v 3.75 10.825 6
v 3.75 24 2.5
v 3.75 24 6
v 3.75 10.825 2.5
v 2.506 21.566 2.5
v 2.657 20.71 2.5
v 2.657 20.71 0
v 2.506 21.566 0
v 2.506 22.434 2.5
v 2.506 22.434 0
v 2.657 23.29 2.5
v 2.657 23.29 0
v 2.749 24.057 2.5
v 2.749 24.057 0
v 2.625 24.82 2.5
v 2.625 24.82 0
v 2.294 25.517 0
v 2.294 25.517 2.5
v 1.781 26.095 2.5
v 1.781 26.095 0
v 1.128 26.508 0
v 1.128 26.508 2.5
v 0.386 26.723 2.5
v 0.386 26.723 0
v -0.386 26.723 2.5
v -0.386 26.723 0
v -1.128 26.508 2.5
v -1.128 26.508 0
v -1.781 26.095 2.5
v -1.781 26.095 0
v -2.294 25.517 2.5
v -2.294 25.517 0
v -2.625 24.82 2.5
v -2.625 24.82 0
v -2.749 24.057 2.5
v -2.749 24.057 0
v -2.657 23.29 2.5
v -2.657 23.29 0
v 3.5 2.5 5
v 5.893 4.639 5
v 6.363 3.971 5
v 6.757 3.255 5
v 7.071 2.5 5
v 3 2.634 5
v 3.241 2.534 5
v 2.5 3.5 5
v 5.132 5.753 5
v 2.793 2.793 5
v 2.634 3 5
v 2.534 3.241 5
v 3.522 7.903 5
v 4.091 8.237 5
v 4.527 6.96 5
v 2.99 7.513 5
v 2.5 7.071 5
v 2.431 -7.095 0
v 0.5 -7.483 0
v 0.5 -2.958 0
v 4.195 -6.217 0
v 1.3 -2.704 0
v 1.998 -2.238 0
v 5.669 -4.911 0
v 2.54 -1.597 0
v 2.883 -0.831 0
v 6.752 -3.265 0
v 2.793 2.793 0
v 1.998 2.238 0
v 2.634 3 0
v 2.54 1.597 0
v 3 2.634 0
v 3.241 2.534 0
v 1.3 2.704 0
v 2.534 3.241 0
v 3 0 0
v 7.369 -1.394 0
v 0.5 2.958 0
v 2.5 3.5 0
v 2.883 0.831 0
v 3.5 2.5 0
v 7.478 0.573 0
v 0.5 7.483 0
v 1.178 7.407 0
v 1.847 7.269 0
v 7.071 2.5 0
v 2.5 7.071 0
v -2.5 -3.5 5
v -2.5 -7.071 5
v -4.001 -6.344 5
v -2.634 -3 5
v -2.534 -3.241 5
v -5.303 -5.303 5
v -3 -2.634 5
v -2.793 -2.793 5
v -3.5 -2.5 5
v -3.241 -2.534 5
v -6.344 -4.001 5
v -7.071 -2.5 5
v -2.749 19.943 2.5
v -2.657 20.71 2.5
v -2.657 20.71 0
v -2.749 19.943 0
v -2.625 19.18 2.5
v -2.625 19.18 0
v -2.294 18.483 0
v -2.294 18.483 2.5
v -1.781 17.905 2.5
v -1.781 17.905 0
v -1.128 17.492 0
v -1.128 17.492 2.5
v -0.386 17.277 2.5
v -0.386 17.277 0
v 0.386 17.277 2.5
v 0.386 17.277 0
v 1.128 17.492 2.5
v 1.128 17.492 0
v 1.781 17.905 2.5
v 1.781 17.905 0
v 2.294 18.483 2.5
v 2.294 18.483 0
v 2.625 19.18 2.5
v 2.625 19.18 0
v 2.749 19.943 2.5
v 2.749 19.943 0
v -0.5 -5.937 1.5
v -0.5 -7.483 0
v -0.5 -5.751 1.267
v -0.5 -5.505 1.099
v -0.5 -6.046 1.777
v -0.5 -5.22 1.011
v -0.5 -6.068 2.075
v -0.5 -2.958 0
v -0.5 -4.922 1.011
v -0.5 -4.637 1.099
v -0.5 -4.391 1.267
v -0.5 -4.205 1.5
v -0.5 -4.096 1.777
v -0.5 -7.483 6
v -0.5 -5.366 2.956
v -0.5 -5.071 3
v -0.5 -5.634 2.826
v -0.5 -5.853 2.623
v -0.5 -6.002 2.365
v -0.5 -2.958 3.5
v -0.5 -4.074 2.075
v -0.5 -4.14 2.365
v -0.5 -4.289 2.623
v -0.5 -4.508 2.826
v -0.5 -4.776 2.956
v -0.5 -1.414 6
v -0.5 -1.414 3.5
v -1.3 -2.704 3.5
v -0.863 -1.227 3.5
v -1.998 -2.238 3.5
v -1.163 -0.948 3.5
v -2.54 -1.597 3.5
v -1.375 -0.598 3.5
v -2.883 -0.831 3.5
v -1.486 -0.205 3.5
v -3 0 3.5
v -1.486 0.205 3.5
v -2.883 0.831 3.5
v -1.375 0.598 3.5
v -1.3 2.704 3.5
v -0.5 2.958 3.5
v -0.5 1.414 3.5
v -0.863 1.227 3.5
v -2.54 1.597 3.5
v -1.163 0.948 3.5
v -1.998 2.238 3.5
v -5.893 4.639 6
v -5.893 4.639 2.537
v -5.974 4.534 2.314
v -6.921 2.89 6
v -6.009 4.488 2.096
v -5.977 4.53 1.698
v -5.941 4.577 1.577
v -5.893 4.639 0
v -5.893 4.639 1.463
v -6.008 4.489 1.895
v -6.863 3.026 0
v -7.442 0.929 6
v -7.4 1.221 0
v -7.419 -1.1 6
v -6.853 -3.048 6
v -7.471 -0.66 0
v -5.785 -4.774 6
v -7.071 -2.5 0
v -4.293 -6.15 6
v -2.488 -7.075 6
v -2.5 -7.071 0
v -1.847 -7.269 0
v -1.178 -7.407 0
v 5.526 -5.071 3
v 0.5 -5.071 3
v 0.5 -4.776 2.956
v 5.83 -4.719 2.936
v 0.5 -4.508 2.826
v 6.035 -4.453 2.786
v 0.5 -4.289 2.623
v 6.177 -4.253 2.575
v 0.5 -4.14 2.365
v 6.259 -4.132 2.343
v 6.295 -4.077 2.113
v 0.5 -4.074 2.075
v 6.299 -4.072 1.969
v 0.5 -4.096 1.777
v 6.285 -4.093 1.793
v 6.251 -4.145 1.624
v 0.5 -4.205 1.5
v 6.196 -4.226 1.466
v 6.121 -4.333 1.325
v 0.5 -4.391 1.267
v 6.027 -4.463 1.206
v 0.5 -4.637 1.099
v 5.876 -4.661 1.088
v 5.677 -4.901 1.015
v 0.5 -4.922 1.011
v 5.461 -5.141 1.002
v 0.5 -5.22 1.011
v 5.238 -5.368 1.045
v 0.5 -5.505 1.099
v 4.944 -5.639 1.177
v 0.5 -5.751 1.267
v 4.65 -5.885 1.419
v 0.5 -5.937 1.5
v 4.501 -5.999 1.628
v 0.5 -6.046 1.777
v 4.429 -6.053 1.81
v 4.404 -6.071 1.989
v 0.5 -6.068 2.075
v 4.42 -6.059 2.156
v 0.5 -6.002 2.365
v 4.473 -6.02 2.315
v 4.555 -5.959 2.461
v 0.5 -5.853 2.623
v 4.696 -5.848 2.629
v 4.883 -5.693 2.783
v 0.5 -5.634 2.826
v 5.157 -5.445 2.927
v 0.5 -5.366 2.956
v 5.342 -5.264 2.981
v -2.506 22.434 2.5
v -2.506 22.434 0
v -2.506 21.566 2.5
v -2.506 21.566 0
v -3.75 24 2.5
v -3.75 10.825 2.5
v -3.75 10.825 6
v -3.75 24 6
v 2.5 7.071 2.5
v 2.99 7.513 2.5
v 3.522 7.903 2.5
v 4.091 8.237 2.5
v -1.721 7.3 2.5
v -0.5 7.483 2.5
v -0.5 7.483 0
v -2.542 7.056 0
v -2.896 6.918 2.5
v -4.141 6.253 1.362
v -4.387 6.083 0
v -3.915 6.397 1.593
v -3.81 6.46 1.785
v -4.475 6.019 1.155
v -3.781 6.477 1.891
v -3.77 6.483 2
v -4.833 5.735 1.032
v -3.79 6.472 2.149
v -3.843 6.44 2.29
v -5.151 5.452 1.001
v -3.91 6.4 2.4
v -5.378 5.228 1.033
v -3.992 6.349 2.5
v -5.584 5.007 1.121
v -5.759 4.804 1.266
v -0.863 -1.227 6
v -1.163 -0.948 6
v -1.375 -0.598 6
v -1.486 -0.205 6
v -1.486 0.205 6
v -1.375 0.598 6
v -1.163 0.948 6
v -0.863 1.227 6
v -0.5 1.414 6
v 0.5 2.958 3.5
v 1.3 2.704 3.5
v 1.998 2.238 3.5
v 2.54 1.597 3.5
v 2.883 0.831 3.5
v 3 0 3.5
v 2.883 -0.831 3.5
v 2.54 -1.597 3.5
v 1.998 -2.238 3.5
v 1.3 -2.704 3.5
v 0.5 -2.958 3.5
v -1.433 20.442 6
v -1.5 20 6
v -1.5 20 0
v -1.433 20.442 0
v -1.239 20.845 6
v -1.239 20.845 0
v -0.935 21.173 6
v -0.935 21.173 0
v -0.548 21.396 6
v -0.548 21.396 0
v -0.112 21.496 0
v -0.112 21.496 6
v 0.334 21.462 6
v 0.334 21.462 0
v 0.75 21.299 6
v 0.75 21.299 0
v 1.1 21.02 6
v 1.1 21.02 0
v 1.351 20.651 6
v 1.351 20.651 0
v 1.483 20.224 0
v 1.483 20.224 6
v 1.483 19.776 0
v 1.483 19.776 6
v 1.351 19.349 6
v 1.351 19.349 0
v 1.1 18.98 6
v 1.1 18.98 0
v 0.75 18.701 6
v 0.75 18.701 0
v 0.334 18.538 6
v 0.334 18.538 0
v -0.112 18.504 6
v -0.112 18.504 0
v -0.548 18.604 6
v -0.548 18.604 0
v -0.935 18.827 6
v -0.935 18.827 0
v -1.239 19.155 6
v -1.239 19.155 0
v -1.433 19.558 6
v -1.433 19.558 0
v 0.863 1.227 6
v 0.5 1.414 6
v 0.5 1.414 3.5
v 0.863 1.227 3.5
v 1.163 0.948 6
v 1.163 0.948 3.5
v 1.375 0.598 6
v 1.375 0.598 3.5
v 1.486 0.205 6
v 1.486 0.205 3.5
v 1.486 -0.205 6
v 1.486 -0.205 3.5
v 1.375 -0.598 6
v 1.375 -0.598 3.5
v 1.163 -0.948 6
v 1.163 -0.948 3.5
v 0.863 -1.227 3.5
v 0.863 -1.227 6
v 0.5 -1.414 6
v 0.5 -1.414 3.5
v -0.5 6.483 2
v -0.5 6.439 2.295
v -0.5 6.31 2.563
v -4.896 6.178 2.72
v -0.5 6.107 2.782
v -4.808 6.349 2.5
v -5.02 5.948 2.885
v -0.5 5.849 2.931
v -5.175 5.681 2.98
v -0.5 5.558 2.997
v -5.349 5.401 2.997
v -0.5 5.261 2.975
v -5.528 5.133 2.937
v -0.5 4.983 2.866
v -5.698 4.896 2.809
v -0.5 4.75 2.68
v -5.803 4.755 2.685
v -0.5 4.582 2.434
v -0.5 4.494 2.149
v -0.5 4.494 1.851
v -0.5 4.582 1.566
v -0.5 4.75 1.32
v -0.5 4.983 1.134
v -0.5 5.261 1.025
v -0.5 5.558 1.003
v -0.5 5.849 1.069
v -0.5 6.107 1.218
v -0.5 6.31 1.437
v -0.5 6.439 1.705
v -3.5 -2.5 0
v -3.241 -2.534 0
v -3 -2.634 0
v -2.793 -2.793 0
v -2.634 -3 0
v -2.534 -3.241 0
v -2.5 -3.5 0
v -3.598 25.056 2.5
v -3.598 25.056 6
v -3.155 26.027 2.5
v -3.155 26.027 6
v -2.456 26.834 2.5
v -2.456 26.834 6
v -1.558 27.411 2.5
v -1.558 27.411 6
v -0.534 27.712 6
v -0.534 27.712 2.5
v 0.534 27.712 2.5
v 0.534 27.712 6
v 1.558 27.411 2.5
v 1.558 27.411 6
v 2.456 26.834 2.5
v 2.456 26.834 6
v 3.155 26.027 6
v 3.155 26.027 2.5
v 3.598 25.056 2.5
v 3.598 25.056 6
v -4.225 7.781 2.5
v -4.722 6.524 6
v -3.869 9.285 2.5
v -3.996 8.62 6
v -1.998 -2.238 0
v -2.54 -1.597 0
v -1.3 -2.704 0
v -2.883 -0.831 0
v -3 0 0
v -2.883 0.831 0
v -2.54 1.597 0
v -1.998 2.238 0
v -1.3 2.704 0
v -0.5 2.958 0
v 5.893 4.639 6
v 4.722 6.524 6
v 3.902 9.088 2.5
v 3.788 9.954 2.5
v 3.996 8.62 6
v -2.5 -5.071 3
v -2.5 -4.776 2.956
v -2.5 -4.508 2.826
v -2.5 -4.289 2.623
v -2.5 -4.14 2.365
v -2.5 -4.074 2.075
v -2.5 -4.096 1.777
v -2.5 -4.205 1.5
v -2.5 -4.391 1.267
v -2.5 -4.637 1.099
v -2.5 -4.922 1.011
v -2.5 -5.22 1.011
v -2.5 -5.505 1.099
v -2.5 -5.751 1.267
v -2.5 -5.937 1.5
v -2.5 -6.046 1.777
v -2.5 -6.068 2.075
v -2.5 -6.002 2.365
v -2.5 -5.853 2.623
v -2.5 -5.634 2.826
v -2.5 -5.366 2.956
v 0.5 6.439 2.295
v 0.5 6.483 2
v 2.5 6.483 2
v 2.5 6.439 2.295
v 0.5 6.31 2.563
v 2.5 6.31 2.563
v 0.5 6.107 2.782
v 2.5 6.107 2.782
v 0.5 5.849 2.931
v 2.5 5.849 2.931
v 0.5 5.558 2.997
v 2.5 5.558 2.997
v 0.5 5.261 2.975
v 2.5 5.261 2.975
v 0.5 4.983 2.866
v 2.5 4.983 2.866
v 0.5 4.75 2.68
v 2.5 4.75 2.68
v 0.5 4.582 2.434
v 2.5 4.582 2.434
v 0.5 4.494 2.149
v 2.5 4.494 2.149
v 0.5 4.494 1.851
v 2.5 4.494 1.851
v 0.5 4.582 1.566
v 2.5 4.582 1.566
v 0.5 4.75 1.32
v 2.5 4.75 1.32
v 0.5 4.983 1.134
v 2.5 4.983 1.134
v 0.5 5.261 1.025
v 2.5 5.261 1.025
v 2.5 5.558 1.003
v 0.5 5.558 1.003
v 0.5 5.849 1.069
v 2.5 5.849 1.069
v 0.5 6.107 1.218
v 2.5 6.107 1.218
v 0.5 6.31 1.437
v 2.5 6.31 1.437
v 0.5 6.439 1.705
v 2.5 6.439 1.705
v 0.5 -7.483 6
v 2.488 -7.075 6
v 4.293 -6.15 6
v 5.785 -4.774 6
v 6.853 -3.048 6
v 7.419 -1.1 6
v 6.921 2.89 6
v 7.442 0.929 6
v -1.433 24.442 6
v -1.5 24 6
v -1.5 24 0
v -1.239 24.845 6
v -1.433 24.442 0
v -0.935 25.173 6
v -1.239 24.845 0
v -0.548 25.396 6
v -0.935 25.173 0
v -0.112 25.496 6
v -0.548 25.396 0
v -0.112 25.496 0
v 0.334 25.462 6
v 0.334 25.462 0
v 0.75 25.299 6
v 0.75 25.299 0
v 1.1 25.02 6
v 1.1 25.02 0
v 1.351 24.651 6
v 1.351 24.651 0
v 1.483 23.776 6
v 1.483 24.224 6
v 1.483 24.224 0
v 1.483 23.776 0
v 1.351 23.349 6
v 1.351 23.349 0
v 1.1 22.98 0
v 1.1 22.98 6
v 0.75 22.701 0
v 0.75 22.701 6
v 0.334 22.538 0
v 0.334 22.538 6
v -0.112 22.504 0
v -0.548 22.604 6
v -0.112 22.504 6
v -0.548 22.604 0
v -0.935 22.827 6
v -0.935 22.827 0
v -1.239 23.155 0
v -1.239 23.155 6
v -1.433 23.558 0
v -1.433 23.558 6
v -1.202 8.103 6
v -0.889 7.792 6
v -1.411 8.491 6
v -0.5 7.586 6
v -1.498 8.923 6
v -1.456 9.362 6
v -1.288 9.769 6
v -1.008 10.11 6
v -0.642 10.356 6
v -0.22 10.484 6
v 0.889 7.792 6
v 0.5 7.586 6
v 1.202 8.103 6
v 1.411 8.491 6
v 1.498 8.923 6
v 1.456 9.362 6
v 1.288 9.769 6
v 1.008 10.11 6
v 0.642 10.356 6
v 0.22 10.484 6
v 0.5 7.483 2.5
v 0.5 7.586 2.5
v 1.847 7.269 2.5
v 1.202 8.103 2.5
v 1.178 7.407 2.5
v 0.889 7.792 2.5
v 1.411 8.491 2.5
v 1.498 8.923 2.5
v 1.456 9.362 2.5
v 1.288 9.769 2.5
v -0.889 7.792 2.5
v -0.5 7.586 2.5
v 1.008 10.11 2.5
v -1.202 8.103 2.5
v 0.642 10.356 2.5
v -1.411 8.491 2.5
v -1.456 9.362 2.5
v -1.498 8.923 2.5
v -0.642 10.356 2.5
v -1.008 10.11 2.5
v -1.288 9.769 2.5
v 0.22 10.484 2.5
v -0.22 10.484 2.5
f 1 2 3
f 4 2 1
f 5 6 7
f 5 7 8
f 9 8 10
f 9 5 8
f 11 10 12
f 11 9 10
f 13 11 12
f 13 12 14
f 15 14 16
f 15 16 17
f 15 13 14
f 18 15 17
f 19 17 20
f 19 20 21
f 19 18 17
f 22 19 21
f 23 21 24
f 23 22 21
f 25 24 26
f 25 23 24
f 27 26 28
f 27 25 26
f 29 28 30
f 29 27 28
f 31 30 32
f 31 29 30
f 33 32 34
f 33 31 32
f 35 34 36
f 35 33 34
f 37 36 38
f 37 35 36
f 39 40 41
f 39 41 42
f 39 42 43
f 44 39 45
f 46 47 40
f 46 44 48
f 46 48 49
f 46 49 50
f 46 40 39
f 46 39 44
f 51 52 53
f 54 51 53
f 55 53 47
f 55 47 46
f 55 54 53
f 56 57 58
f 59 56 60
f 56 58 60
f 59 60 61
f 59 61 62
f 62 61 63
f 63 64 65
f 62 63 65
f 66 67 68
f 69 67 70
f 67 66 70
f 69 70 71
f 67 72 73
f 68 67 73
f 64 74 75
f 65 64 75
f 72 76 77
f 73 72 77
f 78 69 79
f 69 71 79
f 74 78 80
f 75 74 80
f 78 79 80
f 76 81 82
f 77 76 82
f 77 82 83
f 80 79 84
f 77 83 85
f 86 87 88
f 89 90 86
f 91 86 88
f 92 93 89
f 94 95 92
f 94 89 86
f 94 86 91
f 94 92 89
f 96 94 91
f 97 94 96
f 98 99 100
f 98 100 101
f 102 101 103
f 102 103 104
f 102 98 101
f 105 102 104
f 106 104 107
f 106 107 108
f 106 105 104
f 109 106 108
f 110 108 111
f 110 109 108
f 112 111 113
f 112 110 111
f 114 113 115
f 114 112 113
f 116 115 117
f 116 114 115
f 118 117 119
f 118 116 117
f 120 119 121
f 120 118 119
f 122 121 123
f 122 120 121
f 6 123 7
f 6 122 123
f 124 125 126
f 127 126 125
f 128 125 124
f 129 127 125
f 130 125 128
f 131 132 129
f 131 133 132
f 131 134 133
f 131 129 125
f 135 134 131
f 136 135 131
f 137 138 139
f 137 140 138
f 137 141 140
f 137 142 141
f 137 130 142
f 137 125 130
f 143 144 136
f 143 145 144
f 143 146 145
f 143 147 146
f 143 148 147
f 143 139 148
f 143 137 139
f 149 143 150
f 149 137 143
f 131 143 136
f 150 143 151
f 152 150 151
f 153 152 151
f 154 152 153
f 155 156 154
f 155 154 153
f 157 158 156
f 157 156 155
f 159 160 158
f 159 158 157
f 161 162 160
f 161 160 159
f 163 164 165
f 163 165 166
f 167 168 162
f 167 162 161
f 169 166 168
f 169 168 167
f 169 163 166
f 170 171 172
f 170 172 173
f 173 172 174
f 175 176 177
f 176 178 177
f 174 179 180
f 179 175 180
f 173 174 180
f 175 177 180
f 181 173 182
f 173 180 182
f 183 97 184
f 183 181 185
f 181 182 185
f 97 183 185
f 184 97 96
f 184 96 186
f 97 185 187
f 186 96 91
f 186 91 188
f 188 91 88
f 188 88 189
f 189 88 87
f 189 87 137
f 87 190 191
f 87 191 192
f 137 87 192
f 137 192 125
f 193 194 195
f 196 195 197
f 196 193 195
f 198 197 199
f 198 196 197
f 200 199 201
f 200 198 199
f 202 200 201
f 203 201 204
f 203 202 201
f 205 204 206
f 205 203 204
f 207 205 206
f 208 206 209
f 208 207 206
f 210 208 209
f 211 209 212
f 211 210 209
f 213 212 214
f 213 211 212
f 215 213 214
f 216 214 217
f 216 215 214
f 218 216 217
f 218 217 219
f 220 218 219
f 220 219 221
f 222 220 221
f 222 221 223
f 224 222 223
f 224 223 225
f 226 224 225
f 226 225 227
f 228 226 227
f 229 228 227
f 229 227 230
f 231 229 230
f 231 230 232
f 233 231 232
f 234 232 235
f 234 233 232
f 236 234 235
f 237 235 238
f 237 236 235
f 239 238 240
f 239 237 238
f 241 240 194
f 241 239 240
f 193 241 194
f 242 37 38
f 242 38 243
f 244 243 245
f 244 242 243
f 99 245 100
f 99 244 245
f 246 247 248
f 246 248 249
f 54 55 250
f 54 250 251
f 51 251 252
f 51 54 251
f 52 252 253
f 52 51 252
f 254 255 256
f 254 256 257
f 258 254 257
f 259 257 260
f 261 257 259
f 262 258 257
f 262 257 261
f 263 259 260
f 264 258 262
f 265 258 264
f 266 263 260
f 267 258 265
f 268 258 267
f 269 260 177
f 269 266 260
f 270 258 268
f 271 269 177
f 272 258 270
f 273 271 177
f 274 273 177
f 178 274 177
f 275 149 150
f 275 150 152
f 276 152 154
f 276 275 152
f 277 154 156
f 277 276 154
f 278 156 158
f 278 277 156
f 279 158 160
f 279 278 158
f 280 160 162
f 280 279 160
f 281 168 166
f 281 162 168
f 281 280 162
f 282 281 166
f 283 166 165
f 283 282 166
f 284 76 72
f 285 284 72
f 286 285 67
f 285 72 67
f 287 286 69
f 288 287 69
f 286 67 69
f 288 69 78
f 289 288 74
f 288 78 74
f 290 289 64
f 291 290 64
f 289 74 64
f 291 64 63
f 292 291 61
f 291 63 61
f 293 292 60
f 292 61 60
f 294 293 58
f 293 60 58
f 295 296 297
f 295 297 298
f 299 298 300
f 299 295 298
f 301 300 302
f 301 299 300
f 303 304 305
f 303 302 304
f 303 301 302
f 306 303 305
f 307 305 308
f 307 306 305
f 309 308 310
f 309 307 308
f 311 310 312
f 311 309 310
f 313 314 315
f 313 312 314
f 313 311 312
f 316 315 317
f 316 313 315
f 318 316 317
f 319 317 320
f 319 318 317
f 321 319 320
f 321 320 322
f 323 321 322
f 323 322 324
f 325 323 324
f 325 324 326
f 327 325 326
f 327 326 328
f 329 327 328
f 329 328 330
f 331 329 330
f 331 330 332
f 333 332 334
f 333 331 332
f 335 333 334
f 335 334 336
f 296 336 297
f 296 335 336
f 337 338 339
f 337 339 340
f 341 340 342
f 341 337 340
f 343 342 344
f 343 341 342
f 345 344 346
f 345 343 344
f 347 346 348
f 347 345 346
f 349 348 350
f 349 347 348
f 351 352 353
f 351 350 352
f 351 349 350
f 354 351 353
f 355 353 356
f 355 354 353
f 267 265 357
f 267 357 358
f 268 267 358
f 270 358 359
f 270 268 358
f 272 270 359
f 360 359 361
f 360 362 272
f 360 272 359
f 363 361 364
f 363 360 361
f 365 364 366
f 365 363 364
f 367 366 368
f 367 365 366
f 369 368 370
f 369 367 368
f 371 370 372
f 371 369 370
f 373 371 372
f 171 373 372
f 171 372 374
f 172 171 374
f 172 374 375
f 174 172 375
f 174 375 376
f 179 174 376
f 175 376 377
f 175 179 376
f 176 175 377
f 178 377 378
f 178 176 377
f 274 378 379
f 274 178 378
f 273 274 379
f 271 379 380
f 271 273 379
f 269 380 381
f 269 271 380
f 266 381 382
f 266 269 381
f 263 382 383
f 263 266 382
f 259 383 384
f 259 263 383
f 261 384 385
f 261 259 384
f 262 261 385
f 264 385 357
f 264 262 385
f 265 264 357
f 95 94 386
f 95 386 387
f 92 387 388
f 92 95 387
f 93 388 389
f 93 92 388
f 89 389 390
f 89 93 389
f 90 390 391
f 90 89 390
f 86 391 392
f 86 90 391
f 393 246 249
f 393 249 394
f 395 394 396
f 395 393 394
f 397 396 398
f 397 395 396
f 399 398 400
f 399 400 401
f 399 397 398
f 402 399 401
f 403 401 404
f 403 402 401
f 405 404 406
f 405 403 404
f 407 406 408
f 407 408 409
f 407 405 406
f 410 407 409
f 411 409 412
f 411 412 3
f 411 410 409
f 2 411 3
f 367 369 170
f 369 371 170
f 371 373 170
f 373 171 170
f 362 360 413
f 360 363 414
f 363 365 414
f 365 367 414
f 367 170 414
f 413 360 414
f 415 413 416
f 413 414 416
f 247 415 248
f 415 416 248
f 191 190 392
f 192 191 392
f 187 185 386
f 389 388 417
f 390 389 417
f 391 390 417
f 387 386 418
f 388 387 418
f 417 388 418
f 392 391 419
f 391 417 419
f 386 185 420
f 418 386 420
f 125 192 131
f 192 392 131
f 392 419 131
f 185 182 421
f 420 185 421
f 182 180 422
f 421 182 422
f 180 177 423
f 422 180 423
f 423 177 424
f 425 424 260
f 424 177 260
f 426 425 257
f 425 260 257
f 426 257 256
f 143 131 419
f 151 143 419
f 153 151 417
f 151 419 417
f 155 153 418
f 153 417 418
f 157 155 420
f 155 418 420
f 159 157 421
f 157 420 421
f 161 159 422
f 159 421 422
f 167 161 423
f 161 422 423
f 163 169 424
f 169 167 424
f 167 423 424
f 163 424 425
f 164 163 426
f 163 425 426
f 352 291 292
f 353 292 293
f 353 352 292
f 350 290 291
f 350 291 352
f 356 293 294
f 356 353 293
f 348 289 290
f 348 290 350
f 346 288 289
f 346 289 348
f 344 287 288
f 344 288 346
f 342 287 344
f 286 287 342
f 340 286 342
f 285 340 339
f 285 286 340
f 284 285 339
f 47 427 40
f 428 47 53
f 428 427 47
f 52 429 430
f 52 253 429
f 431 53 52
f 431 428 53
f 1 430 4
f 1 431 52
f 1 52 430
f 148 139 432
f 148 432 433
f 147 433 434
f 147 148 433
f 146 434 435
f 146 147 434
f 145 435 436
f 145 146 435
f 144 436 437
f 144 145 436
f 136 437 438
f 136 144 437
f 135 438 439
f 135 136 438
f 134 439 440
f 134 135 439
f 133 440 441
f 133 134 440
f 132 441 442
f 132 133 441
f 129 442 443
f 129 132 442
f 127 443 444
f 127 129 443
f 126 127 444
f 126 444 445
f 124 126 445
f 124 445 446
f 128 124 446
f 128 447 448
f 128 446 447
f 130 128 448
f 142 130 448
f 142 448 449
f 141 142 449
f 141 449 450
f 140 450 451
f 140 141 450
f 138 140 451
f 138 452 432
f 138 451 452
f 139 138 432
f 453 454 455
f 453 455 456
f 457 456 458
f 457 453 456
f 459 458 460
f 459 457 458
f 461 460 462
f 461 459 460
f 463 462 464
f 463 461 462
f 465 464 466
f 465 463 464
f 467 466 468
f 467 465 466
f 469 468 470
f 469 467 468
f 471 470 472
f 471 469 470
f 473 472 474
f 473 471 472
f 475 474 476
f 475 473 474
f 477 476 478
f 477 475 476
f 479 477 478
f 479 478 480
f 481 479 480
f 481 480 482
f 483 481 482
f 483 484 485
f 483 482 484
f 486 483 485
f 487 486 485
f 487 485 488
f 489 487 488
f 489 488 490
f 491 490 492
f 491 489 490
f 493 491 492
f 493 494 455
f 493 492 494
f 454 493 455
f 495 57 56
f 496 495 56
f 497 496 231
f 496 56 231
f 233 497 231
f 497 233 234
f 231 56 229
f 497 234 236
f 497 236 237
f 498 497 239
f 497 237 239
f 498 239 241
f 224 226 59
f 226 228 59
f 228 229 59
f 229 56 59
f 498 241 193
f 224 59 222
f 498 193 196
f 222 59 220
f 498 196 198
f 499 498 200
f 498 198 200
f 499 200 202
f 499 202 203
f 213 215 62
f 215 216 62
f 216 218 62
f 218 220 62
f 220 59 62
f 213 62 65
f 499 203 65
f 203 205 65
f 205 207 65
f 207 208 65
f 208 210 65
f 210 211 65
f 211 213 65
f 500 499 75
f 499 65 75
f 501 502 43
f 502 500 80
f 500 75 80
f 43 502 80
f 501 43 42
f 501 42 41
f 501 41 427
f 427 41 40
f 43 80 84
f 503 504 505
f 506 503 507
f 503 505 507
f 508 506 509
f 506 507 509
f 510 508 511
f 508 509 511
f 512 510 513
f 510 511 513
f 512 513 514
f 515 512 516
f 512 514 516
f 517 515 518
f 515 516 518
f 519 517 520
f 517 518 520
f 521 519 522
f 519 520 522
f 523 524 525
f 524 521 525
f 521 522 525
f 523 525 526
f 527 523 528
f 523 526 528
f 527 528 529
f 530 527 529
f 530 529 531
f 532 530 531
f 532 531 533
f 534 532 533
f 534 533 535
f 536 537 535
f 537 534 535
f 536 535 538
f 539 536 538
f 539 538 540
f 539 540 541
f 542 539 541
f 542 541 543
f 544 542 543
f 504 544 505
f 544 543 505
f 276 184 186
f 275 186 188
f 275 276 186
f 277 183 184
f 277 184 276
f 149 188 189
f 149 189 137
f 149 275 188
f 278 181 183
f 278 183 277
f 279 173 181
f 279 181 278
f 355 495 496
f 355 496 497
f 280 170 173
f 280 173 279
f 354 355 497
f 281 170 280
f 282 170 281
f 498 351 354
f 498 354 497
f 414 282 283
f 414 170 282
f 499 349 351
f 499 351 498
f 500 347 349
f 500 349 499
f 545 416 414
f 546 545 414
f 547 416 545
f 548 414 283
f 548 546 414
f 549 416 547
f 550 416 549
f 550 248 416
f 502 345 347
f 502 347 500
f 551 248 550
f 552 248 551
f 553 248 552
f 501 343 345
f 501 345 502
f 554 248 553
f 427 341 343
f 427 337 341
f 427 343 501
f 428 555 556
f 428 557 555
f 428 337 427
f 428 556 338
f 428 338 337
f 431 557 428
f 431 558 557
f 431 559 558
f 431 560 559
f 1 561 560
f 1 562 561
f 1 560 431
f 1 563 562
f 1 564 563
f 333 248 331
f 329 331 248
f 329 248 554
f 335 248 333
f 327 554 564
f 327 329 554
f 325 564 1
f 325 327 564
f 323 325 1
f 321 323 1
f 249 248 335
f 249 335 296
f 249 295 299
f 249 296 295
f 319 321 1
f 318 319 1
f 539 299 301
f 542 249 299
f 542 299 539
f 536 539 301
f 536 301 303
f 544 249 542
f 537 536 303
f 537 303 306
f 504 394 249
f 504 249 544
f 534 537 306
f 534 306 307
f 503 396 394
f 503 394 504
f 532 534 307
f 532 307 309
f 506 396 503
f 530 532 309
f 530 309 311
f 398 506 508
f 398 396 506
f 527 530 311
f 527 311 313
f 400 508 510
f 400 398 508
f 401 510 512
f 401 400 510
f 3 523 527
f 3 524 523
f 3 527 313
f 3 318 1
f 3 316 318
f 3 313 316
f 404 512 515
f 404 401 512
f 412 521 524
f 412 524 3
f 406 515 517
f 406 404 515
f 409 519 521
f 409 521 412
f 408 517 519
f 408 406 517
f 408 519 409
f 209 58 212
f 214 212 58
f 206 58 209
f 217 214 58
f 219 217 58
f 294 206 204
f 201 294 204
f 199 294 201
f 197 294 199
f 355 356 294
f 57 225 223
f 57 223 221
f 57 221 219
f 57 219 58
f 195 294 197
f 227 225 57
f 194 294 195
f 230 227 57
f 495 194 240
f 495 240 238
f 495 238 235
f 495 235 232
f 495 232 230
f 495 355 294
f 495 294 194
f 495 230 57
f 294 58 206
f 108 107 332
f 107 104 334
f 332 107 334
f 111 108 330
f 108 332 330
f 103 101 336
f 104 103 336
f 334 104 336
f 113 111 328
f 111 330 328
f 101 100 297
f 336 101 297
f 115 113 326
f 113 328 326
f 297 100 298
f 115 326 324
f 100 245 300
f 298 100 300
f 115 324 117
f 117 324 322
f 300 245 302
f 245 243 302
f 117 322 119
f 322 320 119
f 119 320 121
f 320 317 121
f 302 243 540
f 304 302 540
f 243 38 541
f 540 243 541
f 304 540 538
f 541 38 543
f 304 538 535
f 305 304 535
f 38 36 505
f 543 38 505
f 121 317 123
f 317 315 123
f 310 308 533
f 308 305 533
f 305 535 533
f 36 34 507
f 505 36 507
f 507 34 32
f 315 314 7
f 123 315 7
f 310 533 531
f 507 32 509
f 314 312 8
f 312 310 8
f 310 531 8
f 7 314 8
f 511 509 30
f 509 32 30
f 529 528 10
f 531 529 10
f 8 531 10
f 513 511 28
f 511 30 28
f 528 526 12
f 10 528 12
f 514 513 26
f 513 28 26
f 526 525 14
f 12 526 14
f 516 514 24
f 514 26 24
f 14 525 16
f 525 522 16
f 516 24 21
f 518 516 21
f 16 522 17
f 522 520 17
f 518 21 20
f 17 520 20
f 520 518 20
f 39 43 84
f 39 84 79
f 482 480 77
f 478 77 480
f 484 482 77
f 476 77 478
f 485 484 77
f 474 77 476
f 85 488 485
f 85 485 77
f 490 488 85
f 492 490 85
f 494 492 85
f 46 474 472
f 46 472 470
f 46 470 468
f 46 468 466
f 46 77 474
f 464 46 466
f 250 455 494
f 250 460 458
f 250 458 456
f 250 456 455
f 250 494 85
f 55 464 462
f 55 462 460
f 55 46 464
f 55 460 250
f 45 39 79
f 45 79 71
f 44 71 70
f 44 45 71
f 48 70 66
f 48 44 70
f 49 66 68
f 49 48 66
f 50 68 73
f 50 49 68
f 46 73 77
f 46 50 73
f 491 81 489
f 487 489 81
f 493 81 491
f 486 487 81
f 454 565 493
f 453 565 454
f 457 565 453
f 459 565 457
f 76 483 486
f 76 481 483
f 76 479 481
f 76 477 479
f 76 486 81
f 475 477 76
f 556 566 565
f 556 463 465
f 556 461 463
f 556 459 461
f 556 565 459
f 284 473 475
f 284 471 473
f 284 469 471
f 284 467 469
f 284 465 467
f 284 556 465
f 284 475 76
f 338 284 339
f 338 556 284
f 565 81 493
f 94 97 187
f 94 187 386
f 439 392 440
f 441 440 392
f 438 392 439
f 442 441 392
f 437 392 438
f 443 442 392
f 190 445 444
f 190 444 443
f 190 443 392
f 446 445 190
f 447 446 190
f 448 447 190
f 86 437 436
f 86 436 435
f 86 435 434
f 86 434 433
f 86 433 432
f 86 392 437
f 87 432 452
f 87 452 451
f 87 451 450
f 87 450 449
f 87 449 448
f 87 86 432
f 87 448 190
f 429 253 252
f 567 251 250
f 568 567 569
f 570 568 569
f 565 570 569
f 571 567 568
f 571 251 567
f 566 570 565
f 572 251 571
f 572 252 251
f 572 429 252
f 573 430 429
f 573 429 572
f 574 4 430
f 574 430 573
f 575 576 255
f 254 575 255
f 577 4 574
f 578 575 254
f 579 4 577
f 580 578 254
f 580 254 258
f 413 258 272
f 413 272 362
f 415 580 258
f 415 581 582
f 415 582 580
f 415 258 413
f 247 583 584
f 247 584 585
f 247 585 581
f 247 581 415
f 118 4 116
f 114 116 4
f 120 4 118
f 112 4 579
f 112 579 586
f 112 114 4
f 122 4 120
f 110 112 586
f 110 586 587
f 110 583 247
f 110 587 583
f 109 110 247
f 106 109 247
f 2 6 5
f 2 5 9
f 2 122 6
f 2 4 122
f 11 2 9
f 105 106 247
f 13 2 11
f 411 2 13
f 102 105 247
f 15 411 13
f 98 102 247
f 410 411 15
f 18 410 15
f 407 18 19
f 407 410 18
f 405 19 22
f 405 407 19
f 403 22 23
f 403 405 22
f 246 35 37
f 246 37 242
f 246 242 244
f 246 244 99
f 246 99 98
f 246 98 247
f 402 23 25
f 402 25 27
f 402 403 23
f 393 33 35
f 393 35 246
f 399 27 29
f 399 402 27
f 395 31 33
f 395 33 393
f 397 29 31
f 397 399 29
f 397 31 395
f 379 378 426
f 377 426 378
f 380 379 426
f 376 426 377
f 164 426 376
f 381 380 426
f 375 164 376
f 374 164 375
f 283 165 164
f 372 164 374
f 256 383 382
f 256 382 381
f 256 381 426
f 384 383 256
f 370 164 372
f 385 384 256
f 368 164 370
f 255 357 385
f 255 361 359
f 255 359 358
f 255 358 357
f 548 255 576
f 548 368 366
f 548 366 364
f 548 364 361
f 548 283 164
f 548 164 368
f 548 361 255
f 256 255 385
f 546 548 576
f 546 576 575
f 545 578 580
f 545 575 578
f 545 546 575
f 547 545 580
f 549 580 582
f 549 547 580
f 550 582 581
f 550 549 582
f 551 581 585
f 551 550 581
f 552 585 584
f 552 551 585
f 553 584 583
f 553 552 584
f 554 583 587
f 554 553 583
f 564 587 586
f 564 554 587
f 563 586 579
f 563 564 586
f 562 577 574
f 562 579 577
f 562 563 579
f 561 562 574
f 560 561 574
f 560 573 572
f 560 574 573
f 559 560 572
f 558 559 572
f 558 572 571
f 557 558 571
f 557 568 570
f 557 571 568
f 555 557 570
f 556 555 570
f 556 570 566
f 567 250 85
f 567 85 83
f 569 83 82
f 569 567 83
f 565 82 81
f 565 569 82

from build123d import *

# Parameters (mm, degrees)
SKETCH_1_R               = 7.5
EXTRUDE_1_DEPTH          = 6
FILLET_1_R               = 10
SKETCH_2_R               = 1.5
SKETCH_2_R_2             = 3
CUT_EXTRUDE_1_DEPTH      = 3.5
CUT_EXTRUDE_2_DEPTH      = 29.957943642
CUT_EXTRUDE_2_DEPTH_BACK = 29.957943642
SKETCH_3_R               = 1.5
CUT_EXTRUDE_3_DEPTH      = 30.365157926
CUT_EXTRUDE_3_DEPTH_BACK = 2.5
CUT_EXTRUDE_START        = -5
CUT_EXTRUDE_4_DEPTH      = 5
CUT_EXTRUDE_5_DEPTH      = 31.10087208
CUT_EXTRUDE_5_DEPTH_BACK = 31.10087208
SKETCH_6_R               = 1
CUT_EXTRUDE_6_DEPTH      = 31.1008721
CUT_EXTRUDE_6_DEPTH_BACK = 31.1008721
SKETCH_7_R               = 1


# Read off the part's stored shape, not the designer's step: 除料-伸長4
with BuildPart() as part:
    # 草圖1 → 填料-伸長1 (new body)
    with BuildSketch(Plane.XY):
        Circle(SKETCH_1_R)
        with BuildLine():
            Line((-3.75, 0), (-3.75, 24))
            ThreePointArc((-3.75, 24), (0, 27.75), (3.75, 24))
            Line((3.75, 24), (3.75, 0))
            ThreePointArc((3.75, 0), (0, -3.75), (-3.75, 0))
        make_face()
    extrude(amount=EXTRUDE_1_DEPTH)

    # 圓角1
    fillet_1_edges = [part.edges().sort_by_distance(p)[0] for p in [
        (-3.75, 6.495190528, 3),
        (3.75, 6.495190528, 3),
    ]]
    fillet(fillet_1_edges, radius=FILLET_1_R)

    # 草圖2 → 除料-伸長1 (cut)
    with BuildSketch(Plane(origin=(0, 0, 0), x_dir=(-1, 0, 0), z_dir=(0, 0, -1))):
        with Locations((0, 24)):
            Circle(SKETCH_2_R)
        Circle(SKETCH_2_R_2)
    extrude(amount=-CUT_EXTRUDE_1_DEPTH, mode=Mode.SUBTRACT)

    # 草圖3 → 除料-伸長2 (cut, two sides: drawn at the far end of the back side and taken through both)
    with BuildSketch(Plane(origin=(0, 0, 3.5), x_dir=(-1, 0, 0), z_dir=(0, 0, -1)).offset(-CUT_EXTRUDE_2_DEPTH_BACK)):
        with BuildLine():
            Line((-0.5, 7.585786438), (-0.5, 1.414213562))
            ThreePointArc((-0.5, 1.414213562), (-1.5, 0), (-0.5, -1.414213562))
            Line((-0.5, -1.414213562), (-0.5, -8))
            ThreePointArc((-0.5, -8), (0, -8.5), (0.5, -8))
            Line((0.5, -8), (0.5, -1.414213562))
            ThreePointArc((0.5, -1.414213562), (1.5, 0), (0.5, 1.414213562))
            Line((0.5, 1.414213562), (0.5, 7.585786438))
            ThreePointArc((0.5, 7.585786438), (0, 10.5), (-0.5, 7.585786438))
        make_face()
        with Locations((0, 24)):
            Circle(SKETCH_3_R)
        with Locations((0, 20)):
            Circle(SKETCH_3_R)
    extrude(amount=CUT_EXTRUDE_2_DEPTH + CUT_EXTRUDE_2_DEPTH_BACK, mode=Mode.SUBTRACT)

    # 草圖4 → 除料-伸長3 (cut, two sides: drawn at the far end of the back side and taken through both)
    with BuildSketch(Plane(origin=(0, 0, 0), x_dir=(-1, 0, 0), z_dir=(0, 0, -1)).offset(-CUT_EXTRUDE_3_DEPTH_BACK)):
        with BuildLine():
            Line((0.5, 7.585786438), (0.5, 7.483314774))
            ThreePointArc((0.5, 7.483314774), (3.498440712, 6.634072097), (5.892857143, 4.639421806))
            ThreePointArc((5.892857143, 4.639421806), (4.300888175, 7.552049194), (3.75, 10.825317547))
            Line((3.75, 10.825317547), (3.75, 24))
            ThreePointArc((3.75, 24), (0, 27.75), (-3.75, 24))
            Line((-3.75, 24), (-3.75, 10.825317547))
            ThreePointArc((-3.75, 10.825317547), (-4.300888175, 7.552049194), (-5.892857143, 4.639421806))
            ThreePointArc((-5.892857143, 4.639421806), (-3.498440712, 6.634072097), (-0.5, 7.483314774))
            Line((-0.5, 7.483314774), (-0.5, 7.585786438))
            ThreePointArc((-0.5, 7.585786438), (0, 10.5), (0.5, 7.585786438))
        make_face()
        with BuildLine():
            ThreePointArc((-2.656851136, 23.290322581), (0, 26.75), (2.656851136, 23.290322581))
            ThreePointArc((2.656851136, 23.290322581), (2.487489566, 22), (2.656851136, 20.709677419))
            ThreePointArc((2.656851136, 20.709677419), (0, 17.25), (-2.656851136, 20.709677419))
            ThreePointArc((-2.656851136, 20.709677419), (-2.487489566, 22), (-2.656851136, 23.290322581))
        make_face(mode=Mode.SUBTRACT)
    extrude(amount=CUT_EXTRUDE_3_DEPTH + CUT_EXTRUDE_3_DEPTH_BACK, mode=Mode.SUBTRACT)

    # 除料-伸長4 outline → 除料-伸長4 (cut)
    with BuildSketch(Plane(origin=(0, 0, 0), x_dir=(-1, 0, 0), z_dir=(0, 0, -1)).offset(CUT_EXTRUDE_START)):
        with BuildLine():
            ThreePointArc((-4.090898557, 8.23654191), (-4.80910956, 6.346425035), (-5.892857143, 4.639421806))
            ThreePointArc((-5.892857143, 4.639421806), (-6.569636137, 3.617994061), (-7.071067812, 2.5))
            Line((-7.071067812, 2.5), (-3.5, 2.5))
            ThreePointArc((-3.5, 2.5), (-2.792893219, 2.792893219), (-2.5, 3.5))
            Line((-2.5, 3.5), (-2.5, 7.071067812))
            ThreePointArc((-2.5, 7.071067812), (-3.250743509, 7.714829249), (-4.090898557, 8.23654191))
        make_face()
        with BuildLine():
            Line((7.071067812, -2.5), (3.5, -2.5))
            ThreePointArc((3.5, -2.5), (2.792893219, -2.792893219), (2.5, -3.5))
            Line((2.5, -3.5), (2.5, -7.071067812))
            ThreePointArc((2.5, -7.071067812), (5.303300859, -5.303300859), (7.071067812, -2.5))
        make_face()
    extrude(amount=CUT_EXTRUDE_4_DEPTH, mode=Mode.SUBTRACT)

    # 草圖6 → 除料-伸長5 (cut, two sides: drawn at the far end of the back side and taken through both)
    with BuildSketch(Plane.ZY.offset(2.5).offset(-CUT_EXTRUDE_5_DEPTH_BACK)):
        with Locations((2, -5.071067812)):
            Circle(SKETCH_6_R)
    extrude(amount=CUT_EXTRUDE_5_DEPTH + CUT_EXTRUDE_5_DEPTH_BACK, mode=Mode.SUBTRACT)

    # 草圖7 → 除料-伸長6 (cut, two sides: drawn at the far end of the back side and taken through both)
    with BuildSketch(Plane(origin=(2.5, 0, 0), x_dir=(0, 0, -1), z_dir=(1, 0, 0)).offset(-CUT_EXTRUDE_6_DEPTH_BACK)):
        with Locations(Location((-2, 5.483314774, 0), (0, 0, 90))):
            Circle(SKETCH_7_R)
    extrude(amount=CUT_EXTRUDE_6_DEPTH + CUT_EXTRUDE_6_DEPTH_BACK, mode=Mode.SUBTRACT)


solid = part.part
